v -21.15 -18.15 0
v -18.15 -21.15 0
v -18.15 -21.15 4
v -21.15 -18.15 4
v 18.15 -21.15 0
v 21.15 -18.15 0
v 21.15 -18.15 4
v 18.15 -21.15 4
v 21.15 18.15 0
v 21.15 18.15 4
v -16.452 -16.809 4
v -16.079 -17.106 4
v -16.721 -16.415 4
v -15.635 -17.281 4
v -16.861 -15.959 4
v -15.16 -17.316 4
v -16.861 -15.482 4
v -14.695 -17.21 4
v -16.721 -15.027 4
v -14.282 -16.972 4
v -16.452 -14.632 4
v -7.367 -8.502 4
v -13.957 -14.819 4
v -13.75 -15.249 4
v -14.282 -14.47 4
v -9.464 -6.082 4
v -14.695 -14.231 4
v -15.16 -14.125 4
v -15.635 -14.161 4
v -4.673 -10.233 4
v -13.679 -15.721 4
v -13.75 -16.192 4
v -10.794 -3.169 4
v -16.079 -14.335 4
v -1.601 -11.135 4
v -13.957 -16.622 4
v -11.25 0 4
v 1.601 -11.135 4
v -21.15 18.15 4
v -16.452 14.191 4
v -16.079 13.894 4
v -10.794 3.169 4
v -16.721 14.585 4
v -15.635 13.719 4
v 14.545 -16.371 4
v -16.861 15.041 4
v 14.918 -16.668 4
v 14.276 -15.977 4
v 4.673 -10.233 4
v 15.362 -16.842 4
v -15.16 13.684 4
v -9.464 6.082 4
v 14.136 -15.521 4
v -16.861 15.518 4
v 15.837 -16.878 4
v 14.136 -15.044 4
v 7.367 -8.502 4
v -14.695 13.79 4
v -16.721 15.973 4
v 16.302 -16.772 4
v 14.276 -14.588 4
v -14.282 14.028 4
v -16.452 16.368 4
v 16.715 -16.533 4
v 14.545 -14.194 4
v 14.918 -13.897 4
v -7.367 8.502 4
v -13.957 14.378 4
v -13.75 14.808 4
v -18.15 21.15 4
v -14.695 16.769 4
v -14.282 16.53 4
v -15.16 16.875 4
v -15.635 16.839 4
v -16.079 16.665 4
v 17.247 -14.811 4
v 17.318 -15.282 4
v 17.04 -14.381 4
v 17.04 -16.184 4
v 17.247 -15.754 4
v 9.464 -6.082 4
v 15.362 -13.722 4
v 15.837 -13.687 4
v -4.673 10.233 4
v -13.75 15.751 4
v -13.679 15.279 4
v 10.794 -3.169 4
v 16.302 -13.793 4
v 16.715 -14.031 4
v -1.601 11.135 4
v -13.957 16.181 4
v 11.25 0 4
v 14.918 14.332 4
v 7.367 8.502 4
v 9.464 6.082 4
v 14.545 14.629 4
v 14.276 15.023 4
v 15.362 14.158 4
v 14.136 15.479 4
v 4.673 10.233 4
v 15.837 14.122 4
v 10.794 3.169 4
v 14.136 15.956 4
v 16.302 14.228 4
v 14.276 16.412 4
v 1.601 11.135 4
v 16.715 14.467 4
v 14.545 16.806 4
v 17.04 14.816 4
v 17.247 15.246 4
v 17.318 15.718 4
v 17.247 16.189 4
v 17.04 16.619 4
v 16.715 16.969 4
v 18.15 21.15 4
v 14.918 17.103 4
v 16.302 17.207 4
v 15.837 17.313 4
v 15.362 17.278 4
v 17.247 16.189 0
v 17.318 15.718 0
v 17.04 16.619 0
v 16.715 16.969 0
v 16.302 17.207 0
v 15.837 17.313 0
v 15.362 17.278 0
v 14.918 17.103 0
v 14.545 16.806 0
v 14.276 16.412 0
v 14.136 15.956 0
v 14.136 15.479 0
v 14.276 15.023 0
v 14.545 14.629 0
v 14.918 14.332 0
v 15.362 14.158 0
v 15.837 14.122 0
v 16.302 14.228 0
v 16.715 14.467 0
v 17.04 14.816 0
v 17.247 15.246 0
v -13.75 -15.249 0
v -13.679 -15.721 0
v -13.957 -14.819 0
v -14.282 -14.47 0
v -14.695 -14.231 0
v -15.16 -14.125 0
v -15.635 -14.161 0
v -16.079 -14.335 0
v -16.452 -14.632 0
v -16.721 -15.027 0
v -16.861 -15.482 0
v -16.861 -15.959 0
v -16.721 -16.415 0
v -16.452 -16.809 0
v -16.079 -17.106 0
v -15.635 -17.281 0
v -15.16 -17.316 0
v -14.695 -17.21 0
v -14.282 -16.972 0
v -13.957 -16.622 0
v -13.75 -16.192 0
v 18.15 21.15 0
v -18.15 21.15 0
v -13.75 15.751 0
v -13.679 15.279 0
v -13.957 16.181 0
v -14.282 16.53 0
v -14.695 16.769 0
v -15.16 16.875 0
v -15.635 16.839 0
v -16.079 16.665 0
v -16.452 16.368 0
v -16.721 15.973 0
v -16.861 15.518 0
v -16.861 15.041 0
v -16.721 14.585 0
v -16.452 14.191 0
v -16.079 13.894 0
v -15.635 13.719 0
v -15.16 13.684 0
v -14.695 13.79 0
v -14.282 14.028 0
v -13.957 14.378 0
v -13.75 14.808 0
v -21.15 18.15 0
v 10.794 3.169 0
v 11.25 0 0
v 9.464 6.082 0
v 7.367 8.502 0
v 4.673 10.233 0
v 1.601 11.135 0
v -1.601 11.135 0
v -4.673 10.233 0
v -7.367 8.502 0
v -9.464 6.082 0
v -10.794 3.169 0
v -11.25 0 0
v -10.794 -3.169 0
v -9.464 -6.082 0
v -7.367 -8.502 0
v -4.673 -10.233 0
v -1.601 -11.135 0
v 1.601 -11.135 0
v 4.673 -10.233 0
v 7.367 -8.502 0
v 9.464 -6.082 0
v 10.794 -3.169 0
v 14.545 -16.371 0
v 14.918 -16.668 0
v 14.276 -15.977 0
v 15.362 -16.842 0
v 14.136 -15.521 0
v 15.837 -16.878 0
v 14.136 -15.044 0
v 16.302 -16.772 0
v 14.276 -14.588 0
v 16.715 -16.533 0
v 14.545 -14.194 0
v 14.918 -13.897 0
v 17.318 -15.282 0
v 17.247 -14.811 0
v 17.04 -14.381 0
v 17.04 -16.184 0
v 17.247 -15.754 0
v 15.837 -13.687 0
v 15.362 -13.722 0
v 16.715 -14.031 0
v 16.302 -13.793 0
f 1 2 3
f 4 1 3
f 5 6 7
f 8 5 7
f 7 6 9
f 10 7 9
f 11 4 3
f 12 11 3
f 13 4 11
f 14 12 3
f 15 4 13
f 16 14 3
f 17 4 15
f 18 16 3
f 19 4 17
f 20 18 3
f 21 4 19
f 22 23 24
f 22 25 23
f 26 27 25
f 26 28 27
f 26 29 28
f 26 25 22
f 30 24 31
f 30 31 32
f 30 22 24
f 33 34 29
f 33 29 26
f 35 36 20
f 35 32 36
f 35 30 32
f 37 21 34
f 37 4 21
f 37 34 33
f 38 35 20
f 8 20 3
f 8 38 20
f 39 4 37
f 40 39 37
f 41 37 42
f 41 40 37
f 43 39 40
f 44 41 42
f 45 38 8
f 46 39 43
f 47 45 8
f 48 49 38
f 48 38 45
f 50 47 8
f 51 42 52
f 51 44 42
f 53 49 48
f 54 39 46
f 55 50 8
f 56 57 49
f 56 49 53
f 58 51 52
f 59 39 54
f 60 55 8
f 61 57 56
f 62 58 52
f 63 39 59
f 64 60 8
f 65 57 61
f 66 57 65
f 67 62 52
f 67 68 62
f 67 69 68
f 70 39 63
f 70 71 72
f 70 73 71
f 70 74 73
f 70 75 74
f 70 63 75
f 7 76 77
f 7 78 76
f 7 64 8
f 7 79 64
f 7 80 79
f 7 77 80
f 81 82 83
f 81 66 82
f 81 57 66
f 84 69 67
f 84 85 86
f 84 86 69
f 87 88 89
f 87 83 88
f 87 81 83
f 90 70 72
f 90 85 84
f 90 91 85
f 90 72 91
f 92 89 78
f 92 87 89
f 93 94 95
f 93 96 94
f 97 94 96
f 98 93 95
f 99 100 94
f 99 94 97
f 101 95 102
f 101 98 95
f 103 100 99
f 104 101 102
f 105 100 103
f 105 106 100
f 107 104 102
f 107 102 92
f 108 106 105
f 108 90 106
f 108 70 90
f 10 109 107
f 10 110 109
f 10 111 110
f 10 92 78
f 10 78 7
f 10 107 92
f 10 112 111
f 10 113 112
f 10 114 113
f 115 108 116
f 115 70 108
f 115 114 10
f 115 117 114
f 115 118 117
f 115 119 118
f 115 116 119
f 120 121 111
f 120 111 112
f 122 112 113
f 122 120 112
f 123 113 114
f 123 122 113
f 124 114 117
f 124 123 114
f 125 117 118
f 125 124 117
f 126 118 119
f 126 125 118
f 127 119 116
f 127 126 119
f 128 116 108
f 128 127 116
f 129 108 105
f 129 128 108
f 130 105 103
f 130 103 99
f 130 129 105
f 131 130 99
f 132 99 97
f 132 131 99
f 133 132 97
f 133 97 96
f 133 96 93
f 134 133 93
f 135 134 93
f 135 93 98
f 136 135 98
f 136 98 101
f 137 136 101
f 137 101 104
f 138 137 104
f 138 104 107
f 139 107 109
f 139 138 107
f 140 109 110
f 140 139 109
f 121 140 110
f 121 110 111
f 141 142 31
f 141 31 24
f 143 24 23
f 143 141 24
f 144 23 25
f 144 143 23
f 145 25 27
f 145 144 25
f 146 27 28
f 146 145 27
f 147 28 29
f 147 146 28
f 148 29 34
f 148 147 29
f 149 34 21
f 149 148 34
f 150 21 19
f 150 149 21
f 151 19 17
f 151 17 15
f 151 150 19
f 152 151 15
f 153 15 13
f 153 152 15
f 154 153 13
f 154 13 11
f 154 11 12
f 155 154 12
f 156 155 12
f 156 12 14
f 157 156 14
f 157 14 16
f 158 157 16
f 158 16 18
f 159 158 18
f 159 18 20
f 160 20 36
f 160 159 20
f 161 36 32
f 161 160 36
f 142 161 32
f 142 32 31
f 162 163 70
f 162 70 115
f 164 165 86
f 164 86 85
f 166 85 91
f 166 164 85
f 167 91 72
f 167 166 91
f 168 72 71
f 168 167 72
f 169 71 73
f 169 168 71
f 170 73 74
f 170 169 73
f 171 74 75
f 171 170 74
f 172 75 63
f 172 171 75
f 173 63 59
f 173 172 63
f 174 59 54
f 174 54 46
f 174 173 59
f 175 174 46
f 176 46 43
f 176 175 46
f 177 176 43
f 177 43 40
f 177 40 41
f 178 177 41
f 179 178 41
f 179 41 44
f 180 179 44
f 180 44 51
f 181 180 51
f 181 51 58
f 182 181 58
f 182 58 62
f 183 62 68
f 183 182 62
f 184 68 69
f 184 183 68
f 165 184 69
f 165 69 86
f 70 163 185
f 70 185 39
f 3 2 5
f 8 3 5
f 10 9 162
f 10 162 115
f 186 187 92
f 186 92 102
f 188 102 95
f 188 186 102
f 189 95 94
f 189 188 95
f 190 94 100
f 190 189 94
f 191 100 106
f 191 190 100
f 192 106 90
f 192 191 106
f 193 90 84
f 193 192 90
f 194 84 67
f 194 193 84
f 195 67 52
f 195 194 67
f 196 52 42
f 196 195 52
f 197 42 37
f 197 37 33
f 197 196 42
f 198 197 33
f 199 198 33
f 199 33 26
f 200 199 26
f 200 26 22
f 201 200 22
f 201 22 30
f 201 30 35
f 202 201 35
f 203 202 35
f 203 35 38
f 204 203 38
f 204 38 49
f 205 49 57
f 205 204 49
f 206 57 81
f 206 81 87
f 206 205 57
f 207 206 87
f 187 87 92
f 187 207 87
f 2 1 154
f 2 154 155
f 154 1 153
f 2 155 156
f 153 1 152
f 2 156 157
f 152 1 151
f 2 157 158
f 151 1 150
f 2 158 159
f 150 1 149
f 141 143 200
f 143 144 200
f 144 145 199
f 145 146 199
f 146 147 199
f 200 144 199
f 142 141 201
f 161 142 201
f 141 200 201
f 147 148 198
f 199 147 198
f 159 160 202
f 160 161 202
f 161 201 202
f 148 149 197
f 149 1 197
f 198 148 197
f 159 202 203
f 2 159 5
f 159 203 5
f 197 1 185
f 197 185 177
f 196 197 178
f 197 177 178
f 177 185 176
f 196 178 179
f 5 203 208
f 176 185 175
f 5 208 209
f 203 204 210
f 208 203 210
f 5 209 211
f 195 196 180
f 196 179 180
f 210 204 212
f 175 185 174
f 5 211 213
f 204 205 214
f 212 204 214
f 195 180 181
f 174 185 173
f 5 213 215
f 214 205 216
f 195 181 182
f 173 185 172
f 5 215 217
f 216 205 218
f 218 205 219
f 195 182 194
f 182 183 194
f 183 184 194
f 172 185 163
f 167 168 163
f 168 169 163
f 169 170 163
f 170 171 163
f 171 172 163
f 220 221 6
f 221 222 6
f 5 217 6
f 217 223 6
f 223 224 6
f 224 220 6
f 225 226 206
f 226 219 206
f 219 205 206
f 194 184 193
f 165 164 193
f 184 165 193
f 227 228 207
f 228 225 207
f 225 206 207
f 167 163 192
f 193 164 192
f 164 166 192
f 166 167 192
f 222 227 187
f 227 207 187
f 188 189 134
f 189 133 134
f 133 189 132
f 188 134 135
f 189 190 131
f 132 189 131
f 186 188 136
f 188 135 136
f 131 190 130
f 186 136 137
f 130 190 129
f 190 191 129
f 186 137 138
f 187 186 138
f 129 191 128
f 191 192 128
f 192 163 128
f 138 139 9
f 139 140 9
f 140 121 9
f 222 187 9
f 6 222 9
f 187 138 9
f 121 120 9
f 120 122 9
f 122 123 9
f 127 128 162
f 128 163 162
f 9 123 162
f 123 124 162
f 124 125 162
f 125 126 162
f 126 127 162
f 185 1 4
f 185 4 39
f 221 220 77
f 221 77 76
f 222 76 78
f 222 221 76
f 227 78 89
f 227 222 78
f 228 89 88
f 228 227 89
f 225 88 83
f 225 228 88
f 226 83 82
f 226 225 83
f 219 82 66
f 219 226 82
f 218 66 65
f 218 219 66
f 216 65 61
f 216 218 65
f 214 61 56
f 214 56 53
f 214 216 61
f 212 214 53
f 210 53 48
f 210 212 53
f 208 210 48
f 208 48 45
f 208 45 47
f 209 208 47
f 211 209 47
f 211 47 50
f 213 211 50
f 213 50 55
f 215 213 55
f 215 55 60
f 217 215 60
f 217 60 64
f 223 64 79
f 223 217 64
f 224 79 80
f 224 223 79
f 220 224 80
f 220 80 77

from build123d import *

# Parameters (mm, degrees)
SKETCH1_W           = 42.3
SKETCH1_H           = 42.3
SKETCH1_R           = 11.25
SKETCH1_R_2         = 1.6
BOSS_EXTRUDE1_DEPTH = 4
CHAMFER1_SIZE       = 3


with BuildPart() as part:
    # Sketch1 → Boss-Extrude1 (new body)
    with BuildSketch(Plane.XY):
        Rectangle(SKETCH1_W, SKETCH1_H)
        Circle(SKETCH1_R, mode=Mode.SUBTRACT)
        with Locations((15.717660824, 15.717660824)):
            Circle(SKETCH1_R_2, mode=Mode.SUBTRACT)
        with Locations((-15.279238797, 15.279238797)):
            Circle(SKETCH1_R_2, mode=Mode.SUBTRACT)
        with Locations((-15.279238797, -15.720761203)):
            Circle(SKETCH1_R_2, mode=Mode.SUBTRACT)
        with Locations((15.717660824, -15.282339176)):
            Circle(SKETCH1_R_2, mode=Mode.SUBTRACT)
    extrude(amount=BOSS_EXTRUDE1_DEPTH)

    # Chamfer1
    chamfer1_edges = [part.edges().sort_by_distance(p)[0] for p in [
        (21.15, -21.15, 2),
        (-21.15, -21.15, 2),
        (-21.15, 21.15, 2),
        (21.15, 21.15, 2),
    ]]
    chamfer(chamfer1_edges, length=CHAMFER1_SIZE)


solid = part.part
